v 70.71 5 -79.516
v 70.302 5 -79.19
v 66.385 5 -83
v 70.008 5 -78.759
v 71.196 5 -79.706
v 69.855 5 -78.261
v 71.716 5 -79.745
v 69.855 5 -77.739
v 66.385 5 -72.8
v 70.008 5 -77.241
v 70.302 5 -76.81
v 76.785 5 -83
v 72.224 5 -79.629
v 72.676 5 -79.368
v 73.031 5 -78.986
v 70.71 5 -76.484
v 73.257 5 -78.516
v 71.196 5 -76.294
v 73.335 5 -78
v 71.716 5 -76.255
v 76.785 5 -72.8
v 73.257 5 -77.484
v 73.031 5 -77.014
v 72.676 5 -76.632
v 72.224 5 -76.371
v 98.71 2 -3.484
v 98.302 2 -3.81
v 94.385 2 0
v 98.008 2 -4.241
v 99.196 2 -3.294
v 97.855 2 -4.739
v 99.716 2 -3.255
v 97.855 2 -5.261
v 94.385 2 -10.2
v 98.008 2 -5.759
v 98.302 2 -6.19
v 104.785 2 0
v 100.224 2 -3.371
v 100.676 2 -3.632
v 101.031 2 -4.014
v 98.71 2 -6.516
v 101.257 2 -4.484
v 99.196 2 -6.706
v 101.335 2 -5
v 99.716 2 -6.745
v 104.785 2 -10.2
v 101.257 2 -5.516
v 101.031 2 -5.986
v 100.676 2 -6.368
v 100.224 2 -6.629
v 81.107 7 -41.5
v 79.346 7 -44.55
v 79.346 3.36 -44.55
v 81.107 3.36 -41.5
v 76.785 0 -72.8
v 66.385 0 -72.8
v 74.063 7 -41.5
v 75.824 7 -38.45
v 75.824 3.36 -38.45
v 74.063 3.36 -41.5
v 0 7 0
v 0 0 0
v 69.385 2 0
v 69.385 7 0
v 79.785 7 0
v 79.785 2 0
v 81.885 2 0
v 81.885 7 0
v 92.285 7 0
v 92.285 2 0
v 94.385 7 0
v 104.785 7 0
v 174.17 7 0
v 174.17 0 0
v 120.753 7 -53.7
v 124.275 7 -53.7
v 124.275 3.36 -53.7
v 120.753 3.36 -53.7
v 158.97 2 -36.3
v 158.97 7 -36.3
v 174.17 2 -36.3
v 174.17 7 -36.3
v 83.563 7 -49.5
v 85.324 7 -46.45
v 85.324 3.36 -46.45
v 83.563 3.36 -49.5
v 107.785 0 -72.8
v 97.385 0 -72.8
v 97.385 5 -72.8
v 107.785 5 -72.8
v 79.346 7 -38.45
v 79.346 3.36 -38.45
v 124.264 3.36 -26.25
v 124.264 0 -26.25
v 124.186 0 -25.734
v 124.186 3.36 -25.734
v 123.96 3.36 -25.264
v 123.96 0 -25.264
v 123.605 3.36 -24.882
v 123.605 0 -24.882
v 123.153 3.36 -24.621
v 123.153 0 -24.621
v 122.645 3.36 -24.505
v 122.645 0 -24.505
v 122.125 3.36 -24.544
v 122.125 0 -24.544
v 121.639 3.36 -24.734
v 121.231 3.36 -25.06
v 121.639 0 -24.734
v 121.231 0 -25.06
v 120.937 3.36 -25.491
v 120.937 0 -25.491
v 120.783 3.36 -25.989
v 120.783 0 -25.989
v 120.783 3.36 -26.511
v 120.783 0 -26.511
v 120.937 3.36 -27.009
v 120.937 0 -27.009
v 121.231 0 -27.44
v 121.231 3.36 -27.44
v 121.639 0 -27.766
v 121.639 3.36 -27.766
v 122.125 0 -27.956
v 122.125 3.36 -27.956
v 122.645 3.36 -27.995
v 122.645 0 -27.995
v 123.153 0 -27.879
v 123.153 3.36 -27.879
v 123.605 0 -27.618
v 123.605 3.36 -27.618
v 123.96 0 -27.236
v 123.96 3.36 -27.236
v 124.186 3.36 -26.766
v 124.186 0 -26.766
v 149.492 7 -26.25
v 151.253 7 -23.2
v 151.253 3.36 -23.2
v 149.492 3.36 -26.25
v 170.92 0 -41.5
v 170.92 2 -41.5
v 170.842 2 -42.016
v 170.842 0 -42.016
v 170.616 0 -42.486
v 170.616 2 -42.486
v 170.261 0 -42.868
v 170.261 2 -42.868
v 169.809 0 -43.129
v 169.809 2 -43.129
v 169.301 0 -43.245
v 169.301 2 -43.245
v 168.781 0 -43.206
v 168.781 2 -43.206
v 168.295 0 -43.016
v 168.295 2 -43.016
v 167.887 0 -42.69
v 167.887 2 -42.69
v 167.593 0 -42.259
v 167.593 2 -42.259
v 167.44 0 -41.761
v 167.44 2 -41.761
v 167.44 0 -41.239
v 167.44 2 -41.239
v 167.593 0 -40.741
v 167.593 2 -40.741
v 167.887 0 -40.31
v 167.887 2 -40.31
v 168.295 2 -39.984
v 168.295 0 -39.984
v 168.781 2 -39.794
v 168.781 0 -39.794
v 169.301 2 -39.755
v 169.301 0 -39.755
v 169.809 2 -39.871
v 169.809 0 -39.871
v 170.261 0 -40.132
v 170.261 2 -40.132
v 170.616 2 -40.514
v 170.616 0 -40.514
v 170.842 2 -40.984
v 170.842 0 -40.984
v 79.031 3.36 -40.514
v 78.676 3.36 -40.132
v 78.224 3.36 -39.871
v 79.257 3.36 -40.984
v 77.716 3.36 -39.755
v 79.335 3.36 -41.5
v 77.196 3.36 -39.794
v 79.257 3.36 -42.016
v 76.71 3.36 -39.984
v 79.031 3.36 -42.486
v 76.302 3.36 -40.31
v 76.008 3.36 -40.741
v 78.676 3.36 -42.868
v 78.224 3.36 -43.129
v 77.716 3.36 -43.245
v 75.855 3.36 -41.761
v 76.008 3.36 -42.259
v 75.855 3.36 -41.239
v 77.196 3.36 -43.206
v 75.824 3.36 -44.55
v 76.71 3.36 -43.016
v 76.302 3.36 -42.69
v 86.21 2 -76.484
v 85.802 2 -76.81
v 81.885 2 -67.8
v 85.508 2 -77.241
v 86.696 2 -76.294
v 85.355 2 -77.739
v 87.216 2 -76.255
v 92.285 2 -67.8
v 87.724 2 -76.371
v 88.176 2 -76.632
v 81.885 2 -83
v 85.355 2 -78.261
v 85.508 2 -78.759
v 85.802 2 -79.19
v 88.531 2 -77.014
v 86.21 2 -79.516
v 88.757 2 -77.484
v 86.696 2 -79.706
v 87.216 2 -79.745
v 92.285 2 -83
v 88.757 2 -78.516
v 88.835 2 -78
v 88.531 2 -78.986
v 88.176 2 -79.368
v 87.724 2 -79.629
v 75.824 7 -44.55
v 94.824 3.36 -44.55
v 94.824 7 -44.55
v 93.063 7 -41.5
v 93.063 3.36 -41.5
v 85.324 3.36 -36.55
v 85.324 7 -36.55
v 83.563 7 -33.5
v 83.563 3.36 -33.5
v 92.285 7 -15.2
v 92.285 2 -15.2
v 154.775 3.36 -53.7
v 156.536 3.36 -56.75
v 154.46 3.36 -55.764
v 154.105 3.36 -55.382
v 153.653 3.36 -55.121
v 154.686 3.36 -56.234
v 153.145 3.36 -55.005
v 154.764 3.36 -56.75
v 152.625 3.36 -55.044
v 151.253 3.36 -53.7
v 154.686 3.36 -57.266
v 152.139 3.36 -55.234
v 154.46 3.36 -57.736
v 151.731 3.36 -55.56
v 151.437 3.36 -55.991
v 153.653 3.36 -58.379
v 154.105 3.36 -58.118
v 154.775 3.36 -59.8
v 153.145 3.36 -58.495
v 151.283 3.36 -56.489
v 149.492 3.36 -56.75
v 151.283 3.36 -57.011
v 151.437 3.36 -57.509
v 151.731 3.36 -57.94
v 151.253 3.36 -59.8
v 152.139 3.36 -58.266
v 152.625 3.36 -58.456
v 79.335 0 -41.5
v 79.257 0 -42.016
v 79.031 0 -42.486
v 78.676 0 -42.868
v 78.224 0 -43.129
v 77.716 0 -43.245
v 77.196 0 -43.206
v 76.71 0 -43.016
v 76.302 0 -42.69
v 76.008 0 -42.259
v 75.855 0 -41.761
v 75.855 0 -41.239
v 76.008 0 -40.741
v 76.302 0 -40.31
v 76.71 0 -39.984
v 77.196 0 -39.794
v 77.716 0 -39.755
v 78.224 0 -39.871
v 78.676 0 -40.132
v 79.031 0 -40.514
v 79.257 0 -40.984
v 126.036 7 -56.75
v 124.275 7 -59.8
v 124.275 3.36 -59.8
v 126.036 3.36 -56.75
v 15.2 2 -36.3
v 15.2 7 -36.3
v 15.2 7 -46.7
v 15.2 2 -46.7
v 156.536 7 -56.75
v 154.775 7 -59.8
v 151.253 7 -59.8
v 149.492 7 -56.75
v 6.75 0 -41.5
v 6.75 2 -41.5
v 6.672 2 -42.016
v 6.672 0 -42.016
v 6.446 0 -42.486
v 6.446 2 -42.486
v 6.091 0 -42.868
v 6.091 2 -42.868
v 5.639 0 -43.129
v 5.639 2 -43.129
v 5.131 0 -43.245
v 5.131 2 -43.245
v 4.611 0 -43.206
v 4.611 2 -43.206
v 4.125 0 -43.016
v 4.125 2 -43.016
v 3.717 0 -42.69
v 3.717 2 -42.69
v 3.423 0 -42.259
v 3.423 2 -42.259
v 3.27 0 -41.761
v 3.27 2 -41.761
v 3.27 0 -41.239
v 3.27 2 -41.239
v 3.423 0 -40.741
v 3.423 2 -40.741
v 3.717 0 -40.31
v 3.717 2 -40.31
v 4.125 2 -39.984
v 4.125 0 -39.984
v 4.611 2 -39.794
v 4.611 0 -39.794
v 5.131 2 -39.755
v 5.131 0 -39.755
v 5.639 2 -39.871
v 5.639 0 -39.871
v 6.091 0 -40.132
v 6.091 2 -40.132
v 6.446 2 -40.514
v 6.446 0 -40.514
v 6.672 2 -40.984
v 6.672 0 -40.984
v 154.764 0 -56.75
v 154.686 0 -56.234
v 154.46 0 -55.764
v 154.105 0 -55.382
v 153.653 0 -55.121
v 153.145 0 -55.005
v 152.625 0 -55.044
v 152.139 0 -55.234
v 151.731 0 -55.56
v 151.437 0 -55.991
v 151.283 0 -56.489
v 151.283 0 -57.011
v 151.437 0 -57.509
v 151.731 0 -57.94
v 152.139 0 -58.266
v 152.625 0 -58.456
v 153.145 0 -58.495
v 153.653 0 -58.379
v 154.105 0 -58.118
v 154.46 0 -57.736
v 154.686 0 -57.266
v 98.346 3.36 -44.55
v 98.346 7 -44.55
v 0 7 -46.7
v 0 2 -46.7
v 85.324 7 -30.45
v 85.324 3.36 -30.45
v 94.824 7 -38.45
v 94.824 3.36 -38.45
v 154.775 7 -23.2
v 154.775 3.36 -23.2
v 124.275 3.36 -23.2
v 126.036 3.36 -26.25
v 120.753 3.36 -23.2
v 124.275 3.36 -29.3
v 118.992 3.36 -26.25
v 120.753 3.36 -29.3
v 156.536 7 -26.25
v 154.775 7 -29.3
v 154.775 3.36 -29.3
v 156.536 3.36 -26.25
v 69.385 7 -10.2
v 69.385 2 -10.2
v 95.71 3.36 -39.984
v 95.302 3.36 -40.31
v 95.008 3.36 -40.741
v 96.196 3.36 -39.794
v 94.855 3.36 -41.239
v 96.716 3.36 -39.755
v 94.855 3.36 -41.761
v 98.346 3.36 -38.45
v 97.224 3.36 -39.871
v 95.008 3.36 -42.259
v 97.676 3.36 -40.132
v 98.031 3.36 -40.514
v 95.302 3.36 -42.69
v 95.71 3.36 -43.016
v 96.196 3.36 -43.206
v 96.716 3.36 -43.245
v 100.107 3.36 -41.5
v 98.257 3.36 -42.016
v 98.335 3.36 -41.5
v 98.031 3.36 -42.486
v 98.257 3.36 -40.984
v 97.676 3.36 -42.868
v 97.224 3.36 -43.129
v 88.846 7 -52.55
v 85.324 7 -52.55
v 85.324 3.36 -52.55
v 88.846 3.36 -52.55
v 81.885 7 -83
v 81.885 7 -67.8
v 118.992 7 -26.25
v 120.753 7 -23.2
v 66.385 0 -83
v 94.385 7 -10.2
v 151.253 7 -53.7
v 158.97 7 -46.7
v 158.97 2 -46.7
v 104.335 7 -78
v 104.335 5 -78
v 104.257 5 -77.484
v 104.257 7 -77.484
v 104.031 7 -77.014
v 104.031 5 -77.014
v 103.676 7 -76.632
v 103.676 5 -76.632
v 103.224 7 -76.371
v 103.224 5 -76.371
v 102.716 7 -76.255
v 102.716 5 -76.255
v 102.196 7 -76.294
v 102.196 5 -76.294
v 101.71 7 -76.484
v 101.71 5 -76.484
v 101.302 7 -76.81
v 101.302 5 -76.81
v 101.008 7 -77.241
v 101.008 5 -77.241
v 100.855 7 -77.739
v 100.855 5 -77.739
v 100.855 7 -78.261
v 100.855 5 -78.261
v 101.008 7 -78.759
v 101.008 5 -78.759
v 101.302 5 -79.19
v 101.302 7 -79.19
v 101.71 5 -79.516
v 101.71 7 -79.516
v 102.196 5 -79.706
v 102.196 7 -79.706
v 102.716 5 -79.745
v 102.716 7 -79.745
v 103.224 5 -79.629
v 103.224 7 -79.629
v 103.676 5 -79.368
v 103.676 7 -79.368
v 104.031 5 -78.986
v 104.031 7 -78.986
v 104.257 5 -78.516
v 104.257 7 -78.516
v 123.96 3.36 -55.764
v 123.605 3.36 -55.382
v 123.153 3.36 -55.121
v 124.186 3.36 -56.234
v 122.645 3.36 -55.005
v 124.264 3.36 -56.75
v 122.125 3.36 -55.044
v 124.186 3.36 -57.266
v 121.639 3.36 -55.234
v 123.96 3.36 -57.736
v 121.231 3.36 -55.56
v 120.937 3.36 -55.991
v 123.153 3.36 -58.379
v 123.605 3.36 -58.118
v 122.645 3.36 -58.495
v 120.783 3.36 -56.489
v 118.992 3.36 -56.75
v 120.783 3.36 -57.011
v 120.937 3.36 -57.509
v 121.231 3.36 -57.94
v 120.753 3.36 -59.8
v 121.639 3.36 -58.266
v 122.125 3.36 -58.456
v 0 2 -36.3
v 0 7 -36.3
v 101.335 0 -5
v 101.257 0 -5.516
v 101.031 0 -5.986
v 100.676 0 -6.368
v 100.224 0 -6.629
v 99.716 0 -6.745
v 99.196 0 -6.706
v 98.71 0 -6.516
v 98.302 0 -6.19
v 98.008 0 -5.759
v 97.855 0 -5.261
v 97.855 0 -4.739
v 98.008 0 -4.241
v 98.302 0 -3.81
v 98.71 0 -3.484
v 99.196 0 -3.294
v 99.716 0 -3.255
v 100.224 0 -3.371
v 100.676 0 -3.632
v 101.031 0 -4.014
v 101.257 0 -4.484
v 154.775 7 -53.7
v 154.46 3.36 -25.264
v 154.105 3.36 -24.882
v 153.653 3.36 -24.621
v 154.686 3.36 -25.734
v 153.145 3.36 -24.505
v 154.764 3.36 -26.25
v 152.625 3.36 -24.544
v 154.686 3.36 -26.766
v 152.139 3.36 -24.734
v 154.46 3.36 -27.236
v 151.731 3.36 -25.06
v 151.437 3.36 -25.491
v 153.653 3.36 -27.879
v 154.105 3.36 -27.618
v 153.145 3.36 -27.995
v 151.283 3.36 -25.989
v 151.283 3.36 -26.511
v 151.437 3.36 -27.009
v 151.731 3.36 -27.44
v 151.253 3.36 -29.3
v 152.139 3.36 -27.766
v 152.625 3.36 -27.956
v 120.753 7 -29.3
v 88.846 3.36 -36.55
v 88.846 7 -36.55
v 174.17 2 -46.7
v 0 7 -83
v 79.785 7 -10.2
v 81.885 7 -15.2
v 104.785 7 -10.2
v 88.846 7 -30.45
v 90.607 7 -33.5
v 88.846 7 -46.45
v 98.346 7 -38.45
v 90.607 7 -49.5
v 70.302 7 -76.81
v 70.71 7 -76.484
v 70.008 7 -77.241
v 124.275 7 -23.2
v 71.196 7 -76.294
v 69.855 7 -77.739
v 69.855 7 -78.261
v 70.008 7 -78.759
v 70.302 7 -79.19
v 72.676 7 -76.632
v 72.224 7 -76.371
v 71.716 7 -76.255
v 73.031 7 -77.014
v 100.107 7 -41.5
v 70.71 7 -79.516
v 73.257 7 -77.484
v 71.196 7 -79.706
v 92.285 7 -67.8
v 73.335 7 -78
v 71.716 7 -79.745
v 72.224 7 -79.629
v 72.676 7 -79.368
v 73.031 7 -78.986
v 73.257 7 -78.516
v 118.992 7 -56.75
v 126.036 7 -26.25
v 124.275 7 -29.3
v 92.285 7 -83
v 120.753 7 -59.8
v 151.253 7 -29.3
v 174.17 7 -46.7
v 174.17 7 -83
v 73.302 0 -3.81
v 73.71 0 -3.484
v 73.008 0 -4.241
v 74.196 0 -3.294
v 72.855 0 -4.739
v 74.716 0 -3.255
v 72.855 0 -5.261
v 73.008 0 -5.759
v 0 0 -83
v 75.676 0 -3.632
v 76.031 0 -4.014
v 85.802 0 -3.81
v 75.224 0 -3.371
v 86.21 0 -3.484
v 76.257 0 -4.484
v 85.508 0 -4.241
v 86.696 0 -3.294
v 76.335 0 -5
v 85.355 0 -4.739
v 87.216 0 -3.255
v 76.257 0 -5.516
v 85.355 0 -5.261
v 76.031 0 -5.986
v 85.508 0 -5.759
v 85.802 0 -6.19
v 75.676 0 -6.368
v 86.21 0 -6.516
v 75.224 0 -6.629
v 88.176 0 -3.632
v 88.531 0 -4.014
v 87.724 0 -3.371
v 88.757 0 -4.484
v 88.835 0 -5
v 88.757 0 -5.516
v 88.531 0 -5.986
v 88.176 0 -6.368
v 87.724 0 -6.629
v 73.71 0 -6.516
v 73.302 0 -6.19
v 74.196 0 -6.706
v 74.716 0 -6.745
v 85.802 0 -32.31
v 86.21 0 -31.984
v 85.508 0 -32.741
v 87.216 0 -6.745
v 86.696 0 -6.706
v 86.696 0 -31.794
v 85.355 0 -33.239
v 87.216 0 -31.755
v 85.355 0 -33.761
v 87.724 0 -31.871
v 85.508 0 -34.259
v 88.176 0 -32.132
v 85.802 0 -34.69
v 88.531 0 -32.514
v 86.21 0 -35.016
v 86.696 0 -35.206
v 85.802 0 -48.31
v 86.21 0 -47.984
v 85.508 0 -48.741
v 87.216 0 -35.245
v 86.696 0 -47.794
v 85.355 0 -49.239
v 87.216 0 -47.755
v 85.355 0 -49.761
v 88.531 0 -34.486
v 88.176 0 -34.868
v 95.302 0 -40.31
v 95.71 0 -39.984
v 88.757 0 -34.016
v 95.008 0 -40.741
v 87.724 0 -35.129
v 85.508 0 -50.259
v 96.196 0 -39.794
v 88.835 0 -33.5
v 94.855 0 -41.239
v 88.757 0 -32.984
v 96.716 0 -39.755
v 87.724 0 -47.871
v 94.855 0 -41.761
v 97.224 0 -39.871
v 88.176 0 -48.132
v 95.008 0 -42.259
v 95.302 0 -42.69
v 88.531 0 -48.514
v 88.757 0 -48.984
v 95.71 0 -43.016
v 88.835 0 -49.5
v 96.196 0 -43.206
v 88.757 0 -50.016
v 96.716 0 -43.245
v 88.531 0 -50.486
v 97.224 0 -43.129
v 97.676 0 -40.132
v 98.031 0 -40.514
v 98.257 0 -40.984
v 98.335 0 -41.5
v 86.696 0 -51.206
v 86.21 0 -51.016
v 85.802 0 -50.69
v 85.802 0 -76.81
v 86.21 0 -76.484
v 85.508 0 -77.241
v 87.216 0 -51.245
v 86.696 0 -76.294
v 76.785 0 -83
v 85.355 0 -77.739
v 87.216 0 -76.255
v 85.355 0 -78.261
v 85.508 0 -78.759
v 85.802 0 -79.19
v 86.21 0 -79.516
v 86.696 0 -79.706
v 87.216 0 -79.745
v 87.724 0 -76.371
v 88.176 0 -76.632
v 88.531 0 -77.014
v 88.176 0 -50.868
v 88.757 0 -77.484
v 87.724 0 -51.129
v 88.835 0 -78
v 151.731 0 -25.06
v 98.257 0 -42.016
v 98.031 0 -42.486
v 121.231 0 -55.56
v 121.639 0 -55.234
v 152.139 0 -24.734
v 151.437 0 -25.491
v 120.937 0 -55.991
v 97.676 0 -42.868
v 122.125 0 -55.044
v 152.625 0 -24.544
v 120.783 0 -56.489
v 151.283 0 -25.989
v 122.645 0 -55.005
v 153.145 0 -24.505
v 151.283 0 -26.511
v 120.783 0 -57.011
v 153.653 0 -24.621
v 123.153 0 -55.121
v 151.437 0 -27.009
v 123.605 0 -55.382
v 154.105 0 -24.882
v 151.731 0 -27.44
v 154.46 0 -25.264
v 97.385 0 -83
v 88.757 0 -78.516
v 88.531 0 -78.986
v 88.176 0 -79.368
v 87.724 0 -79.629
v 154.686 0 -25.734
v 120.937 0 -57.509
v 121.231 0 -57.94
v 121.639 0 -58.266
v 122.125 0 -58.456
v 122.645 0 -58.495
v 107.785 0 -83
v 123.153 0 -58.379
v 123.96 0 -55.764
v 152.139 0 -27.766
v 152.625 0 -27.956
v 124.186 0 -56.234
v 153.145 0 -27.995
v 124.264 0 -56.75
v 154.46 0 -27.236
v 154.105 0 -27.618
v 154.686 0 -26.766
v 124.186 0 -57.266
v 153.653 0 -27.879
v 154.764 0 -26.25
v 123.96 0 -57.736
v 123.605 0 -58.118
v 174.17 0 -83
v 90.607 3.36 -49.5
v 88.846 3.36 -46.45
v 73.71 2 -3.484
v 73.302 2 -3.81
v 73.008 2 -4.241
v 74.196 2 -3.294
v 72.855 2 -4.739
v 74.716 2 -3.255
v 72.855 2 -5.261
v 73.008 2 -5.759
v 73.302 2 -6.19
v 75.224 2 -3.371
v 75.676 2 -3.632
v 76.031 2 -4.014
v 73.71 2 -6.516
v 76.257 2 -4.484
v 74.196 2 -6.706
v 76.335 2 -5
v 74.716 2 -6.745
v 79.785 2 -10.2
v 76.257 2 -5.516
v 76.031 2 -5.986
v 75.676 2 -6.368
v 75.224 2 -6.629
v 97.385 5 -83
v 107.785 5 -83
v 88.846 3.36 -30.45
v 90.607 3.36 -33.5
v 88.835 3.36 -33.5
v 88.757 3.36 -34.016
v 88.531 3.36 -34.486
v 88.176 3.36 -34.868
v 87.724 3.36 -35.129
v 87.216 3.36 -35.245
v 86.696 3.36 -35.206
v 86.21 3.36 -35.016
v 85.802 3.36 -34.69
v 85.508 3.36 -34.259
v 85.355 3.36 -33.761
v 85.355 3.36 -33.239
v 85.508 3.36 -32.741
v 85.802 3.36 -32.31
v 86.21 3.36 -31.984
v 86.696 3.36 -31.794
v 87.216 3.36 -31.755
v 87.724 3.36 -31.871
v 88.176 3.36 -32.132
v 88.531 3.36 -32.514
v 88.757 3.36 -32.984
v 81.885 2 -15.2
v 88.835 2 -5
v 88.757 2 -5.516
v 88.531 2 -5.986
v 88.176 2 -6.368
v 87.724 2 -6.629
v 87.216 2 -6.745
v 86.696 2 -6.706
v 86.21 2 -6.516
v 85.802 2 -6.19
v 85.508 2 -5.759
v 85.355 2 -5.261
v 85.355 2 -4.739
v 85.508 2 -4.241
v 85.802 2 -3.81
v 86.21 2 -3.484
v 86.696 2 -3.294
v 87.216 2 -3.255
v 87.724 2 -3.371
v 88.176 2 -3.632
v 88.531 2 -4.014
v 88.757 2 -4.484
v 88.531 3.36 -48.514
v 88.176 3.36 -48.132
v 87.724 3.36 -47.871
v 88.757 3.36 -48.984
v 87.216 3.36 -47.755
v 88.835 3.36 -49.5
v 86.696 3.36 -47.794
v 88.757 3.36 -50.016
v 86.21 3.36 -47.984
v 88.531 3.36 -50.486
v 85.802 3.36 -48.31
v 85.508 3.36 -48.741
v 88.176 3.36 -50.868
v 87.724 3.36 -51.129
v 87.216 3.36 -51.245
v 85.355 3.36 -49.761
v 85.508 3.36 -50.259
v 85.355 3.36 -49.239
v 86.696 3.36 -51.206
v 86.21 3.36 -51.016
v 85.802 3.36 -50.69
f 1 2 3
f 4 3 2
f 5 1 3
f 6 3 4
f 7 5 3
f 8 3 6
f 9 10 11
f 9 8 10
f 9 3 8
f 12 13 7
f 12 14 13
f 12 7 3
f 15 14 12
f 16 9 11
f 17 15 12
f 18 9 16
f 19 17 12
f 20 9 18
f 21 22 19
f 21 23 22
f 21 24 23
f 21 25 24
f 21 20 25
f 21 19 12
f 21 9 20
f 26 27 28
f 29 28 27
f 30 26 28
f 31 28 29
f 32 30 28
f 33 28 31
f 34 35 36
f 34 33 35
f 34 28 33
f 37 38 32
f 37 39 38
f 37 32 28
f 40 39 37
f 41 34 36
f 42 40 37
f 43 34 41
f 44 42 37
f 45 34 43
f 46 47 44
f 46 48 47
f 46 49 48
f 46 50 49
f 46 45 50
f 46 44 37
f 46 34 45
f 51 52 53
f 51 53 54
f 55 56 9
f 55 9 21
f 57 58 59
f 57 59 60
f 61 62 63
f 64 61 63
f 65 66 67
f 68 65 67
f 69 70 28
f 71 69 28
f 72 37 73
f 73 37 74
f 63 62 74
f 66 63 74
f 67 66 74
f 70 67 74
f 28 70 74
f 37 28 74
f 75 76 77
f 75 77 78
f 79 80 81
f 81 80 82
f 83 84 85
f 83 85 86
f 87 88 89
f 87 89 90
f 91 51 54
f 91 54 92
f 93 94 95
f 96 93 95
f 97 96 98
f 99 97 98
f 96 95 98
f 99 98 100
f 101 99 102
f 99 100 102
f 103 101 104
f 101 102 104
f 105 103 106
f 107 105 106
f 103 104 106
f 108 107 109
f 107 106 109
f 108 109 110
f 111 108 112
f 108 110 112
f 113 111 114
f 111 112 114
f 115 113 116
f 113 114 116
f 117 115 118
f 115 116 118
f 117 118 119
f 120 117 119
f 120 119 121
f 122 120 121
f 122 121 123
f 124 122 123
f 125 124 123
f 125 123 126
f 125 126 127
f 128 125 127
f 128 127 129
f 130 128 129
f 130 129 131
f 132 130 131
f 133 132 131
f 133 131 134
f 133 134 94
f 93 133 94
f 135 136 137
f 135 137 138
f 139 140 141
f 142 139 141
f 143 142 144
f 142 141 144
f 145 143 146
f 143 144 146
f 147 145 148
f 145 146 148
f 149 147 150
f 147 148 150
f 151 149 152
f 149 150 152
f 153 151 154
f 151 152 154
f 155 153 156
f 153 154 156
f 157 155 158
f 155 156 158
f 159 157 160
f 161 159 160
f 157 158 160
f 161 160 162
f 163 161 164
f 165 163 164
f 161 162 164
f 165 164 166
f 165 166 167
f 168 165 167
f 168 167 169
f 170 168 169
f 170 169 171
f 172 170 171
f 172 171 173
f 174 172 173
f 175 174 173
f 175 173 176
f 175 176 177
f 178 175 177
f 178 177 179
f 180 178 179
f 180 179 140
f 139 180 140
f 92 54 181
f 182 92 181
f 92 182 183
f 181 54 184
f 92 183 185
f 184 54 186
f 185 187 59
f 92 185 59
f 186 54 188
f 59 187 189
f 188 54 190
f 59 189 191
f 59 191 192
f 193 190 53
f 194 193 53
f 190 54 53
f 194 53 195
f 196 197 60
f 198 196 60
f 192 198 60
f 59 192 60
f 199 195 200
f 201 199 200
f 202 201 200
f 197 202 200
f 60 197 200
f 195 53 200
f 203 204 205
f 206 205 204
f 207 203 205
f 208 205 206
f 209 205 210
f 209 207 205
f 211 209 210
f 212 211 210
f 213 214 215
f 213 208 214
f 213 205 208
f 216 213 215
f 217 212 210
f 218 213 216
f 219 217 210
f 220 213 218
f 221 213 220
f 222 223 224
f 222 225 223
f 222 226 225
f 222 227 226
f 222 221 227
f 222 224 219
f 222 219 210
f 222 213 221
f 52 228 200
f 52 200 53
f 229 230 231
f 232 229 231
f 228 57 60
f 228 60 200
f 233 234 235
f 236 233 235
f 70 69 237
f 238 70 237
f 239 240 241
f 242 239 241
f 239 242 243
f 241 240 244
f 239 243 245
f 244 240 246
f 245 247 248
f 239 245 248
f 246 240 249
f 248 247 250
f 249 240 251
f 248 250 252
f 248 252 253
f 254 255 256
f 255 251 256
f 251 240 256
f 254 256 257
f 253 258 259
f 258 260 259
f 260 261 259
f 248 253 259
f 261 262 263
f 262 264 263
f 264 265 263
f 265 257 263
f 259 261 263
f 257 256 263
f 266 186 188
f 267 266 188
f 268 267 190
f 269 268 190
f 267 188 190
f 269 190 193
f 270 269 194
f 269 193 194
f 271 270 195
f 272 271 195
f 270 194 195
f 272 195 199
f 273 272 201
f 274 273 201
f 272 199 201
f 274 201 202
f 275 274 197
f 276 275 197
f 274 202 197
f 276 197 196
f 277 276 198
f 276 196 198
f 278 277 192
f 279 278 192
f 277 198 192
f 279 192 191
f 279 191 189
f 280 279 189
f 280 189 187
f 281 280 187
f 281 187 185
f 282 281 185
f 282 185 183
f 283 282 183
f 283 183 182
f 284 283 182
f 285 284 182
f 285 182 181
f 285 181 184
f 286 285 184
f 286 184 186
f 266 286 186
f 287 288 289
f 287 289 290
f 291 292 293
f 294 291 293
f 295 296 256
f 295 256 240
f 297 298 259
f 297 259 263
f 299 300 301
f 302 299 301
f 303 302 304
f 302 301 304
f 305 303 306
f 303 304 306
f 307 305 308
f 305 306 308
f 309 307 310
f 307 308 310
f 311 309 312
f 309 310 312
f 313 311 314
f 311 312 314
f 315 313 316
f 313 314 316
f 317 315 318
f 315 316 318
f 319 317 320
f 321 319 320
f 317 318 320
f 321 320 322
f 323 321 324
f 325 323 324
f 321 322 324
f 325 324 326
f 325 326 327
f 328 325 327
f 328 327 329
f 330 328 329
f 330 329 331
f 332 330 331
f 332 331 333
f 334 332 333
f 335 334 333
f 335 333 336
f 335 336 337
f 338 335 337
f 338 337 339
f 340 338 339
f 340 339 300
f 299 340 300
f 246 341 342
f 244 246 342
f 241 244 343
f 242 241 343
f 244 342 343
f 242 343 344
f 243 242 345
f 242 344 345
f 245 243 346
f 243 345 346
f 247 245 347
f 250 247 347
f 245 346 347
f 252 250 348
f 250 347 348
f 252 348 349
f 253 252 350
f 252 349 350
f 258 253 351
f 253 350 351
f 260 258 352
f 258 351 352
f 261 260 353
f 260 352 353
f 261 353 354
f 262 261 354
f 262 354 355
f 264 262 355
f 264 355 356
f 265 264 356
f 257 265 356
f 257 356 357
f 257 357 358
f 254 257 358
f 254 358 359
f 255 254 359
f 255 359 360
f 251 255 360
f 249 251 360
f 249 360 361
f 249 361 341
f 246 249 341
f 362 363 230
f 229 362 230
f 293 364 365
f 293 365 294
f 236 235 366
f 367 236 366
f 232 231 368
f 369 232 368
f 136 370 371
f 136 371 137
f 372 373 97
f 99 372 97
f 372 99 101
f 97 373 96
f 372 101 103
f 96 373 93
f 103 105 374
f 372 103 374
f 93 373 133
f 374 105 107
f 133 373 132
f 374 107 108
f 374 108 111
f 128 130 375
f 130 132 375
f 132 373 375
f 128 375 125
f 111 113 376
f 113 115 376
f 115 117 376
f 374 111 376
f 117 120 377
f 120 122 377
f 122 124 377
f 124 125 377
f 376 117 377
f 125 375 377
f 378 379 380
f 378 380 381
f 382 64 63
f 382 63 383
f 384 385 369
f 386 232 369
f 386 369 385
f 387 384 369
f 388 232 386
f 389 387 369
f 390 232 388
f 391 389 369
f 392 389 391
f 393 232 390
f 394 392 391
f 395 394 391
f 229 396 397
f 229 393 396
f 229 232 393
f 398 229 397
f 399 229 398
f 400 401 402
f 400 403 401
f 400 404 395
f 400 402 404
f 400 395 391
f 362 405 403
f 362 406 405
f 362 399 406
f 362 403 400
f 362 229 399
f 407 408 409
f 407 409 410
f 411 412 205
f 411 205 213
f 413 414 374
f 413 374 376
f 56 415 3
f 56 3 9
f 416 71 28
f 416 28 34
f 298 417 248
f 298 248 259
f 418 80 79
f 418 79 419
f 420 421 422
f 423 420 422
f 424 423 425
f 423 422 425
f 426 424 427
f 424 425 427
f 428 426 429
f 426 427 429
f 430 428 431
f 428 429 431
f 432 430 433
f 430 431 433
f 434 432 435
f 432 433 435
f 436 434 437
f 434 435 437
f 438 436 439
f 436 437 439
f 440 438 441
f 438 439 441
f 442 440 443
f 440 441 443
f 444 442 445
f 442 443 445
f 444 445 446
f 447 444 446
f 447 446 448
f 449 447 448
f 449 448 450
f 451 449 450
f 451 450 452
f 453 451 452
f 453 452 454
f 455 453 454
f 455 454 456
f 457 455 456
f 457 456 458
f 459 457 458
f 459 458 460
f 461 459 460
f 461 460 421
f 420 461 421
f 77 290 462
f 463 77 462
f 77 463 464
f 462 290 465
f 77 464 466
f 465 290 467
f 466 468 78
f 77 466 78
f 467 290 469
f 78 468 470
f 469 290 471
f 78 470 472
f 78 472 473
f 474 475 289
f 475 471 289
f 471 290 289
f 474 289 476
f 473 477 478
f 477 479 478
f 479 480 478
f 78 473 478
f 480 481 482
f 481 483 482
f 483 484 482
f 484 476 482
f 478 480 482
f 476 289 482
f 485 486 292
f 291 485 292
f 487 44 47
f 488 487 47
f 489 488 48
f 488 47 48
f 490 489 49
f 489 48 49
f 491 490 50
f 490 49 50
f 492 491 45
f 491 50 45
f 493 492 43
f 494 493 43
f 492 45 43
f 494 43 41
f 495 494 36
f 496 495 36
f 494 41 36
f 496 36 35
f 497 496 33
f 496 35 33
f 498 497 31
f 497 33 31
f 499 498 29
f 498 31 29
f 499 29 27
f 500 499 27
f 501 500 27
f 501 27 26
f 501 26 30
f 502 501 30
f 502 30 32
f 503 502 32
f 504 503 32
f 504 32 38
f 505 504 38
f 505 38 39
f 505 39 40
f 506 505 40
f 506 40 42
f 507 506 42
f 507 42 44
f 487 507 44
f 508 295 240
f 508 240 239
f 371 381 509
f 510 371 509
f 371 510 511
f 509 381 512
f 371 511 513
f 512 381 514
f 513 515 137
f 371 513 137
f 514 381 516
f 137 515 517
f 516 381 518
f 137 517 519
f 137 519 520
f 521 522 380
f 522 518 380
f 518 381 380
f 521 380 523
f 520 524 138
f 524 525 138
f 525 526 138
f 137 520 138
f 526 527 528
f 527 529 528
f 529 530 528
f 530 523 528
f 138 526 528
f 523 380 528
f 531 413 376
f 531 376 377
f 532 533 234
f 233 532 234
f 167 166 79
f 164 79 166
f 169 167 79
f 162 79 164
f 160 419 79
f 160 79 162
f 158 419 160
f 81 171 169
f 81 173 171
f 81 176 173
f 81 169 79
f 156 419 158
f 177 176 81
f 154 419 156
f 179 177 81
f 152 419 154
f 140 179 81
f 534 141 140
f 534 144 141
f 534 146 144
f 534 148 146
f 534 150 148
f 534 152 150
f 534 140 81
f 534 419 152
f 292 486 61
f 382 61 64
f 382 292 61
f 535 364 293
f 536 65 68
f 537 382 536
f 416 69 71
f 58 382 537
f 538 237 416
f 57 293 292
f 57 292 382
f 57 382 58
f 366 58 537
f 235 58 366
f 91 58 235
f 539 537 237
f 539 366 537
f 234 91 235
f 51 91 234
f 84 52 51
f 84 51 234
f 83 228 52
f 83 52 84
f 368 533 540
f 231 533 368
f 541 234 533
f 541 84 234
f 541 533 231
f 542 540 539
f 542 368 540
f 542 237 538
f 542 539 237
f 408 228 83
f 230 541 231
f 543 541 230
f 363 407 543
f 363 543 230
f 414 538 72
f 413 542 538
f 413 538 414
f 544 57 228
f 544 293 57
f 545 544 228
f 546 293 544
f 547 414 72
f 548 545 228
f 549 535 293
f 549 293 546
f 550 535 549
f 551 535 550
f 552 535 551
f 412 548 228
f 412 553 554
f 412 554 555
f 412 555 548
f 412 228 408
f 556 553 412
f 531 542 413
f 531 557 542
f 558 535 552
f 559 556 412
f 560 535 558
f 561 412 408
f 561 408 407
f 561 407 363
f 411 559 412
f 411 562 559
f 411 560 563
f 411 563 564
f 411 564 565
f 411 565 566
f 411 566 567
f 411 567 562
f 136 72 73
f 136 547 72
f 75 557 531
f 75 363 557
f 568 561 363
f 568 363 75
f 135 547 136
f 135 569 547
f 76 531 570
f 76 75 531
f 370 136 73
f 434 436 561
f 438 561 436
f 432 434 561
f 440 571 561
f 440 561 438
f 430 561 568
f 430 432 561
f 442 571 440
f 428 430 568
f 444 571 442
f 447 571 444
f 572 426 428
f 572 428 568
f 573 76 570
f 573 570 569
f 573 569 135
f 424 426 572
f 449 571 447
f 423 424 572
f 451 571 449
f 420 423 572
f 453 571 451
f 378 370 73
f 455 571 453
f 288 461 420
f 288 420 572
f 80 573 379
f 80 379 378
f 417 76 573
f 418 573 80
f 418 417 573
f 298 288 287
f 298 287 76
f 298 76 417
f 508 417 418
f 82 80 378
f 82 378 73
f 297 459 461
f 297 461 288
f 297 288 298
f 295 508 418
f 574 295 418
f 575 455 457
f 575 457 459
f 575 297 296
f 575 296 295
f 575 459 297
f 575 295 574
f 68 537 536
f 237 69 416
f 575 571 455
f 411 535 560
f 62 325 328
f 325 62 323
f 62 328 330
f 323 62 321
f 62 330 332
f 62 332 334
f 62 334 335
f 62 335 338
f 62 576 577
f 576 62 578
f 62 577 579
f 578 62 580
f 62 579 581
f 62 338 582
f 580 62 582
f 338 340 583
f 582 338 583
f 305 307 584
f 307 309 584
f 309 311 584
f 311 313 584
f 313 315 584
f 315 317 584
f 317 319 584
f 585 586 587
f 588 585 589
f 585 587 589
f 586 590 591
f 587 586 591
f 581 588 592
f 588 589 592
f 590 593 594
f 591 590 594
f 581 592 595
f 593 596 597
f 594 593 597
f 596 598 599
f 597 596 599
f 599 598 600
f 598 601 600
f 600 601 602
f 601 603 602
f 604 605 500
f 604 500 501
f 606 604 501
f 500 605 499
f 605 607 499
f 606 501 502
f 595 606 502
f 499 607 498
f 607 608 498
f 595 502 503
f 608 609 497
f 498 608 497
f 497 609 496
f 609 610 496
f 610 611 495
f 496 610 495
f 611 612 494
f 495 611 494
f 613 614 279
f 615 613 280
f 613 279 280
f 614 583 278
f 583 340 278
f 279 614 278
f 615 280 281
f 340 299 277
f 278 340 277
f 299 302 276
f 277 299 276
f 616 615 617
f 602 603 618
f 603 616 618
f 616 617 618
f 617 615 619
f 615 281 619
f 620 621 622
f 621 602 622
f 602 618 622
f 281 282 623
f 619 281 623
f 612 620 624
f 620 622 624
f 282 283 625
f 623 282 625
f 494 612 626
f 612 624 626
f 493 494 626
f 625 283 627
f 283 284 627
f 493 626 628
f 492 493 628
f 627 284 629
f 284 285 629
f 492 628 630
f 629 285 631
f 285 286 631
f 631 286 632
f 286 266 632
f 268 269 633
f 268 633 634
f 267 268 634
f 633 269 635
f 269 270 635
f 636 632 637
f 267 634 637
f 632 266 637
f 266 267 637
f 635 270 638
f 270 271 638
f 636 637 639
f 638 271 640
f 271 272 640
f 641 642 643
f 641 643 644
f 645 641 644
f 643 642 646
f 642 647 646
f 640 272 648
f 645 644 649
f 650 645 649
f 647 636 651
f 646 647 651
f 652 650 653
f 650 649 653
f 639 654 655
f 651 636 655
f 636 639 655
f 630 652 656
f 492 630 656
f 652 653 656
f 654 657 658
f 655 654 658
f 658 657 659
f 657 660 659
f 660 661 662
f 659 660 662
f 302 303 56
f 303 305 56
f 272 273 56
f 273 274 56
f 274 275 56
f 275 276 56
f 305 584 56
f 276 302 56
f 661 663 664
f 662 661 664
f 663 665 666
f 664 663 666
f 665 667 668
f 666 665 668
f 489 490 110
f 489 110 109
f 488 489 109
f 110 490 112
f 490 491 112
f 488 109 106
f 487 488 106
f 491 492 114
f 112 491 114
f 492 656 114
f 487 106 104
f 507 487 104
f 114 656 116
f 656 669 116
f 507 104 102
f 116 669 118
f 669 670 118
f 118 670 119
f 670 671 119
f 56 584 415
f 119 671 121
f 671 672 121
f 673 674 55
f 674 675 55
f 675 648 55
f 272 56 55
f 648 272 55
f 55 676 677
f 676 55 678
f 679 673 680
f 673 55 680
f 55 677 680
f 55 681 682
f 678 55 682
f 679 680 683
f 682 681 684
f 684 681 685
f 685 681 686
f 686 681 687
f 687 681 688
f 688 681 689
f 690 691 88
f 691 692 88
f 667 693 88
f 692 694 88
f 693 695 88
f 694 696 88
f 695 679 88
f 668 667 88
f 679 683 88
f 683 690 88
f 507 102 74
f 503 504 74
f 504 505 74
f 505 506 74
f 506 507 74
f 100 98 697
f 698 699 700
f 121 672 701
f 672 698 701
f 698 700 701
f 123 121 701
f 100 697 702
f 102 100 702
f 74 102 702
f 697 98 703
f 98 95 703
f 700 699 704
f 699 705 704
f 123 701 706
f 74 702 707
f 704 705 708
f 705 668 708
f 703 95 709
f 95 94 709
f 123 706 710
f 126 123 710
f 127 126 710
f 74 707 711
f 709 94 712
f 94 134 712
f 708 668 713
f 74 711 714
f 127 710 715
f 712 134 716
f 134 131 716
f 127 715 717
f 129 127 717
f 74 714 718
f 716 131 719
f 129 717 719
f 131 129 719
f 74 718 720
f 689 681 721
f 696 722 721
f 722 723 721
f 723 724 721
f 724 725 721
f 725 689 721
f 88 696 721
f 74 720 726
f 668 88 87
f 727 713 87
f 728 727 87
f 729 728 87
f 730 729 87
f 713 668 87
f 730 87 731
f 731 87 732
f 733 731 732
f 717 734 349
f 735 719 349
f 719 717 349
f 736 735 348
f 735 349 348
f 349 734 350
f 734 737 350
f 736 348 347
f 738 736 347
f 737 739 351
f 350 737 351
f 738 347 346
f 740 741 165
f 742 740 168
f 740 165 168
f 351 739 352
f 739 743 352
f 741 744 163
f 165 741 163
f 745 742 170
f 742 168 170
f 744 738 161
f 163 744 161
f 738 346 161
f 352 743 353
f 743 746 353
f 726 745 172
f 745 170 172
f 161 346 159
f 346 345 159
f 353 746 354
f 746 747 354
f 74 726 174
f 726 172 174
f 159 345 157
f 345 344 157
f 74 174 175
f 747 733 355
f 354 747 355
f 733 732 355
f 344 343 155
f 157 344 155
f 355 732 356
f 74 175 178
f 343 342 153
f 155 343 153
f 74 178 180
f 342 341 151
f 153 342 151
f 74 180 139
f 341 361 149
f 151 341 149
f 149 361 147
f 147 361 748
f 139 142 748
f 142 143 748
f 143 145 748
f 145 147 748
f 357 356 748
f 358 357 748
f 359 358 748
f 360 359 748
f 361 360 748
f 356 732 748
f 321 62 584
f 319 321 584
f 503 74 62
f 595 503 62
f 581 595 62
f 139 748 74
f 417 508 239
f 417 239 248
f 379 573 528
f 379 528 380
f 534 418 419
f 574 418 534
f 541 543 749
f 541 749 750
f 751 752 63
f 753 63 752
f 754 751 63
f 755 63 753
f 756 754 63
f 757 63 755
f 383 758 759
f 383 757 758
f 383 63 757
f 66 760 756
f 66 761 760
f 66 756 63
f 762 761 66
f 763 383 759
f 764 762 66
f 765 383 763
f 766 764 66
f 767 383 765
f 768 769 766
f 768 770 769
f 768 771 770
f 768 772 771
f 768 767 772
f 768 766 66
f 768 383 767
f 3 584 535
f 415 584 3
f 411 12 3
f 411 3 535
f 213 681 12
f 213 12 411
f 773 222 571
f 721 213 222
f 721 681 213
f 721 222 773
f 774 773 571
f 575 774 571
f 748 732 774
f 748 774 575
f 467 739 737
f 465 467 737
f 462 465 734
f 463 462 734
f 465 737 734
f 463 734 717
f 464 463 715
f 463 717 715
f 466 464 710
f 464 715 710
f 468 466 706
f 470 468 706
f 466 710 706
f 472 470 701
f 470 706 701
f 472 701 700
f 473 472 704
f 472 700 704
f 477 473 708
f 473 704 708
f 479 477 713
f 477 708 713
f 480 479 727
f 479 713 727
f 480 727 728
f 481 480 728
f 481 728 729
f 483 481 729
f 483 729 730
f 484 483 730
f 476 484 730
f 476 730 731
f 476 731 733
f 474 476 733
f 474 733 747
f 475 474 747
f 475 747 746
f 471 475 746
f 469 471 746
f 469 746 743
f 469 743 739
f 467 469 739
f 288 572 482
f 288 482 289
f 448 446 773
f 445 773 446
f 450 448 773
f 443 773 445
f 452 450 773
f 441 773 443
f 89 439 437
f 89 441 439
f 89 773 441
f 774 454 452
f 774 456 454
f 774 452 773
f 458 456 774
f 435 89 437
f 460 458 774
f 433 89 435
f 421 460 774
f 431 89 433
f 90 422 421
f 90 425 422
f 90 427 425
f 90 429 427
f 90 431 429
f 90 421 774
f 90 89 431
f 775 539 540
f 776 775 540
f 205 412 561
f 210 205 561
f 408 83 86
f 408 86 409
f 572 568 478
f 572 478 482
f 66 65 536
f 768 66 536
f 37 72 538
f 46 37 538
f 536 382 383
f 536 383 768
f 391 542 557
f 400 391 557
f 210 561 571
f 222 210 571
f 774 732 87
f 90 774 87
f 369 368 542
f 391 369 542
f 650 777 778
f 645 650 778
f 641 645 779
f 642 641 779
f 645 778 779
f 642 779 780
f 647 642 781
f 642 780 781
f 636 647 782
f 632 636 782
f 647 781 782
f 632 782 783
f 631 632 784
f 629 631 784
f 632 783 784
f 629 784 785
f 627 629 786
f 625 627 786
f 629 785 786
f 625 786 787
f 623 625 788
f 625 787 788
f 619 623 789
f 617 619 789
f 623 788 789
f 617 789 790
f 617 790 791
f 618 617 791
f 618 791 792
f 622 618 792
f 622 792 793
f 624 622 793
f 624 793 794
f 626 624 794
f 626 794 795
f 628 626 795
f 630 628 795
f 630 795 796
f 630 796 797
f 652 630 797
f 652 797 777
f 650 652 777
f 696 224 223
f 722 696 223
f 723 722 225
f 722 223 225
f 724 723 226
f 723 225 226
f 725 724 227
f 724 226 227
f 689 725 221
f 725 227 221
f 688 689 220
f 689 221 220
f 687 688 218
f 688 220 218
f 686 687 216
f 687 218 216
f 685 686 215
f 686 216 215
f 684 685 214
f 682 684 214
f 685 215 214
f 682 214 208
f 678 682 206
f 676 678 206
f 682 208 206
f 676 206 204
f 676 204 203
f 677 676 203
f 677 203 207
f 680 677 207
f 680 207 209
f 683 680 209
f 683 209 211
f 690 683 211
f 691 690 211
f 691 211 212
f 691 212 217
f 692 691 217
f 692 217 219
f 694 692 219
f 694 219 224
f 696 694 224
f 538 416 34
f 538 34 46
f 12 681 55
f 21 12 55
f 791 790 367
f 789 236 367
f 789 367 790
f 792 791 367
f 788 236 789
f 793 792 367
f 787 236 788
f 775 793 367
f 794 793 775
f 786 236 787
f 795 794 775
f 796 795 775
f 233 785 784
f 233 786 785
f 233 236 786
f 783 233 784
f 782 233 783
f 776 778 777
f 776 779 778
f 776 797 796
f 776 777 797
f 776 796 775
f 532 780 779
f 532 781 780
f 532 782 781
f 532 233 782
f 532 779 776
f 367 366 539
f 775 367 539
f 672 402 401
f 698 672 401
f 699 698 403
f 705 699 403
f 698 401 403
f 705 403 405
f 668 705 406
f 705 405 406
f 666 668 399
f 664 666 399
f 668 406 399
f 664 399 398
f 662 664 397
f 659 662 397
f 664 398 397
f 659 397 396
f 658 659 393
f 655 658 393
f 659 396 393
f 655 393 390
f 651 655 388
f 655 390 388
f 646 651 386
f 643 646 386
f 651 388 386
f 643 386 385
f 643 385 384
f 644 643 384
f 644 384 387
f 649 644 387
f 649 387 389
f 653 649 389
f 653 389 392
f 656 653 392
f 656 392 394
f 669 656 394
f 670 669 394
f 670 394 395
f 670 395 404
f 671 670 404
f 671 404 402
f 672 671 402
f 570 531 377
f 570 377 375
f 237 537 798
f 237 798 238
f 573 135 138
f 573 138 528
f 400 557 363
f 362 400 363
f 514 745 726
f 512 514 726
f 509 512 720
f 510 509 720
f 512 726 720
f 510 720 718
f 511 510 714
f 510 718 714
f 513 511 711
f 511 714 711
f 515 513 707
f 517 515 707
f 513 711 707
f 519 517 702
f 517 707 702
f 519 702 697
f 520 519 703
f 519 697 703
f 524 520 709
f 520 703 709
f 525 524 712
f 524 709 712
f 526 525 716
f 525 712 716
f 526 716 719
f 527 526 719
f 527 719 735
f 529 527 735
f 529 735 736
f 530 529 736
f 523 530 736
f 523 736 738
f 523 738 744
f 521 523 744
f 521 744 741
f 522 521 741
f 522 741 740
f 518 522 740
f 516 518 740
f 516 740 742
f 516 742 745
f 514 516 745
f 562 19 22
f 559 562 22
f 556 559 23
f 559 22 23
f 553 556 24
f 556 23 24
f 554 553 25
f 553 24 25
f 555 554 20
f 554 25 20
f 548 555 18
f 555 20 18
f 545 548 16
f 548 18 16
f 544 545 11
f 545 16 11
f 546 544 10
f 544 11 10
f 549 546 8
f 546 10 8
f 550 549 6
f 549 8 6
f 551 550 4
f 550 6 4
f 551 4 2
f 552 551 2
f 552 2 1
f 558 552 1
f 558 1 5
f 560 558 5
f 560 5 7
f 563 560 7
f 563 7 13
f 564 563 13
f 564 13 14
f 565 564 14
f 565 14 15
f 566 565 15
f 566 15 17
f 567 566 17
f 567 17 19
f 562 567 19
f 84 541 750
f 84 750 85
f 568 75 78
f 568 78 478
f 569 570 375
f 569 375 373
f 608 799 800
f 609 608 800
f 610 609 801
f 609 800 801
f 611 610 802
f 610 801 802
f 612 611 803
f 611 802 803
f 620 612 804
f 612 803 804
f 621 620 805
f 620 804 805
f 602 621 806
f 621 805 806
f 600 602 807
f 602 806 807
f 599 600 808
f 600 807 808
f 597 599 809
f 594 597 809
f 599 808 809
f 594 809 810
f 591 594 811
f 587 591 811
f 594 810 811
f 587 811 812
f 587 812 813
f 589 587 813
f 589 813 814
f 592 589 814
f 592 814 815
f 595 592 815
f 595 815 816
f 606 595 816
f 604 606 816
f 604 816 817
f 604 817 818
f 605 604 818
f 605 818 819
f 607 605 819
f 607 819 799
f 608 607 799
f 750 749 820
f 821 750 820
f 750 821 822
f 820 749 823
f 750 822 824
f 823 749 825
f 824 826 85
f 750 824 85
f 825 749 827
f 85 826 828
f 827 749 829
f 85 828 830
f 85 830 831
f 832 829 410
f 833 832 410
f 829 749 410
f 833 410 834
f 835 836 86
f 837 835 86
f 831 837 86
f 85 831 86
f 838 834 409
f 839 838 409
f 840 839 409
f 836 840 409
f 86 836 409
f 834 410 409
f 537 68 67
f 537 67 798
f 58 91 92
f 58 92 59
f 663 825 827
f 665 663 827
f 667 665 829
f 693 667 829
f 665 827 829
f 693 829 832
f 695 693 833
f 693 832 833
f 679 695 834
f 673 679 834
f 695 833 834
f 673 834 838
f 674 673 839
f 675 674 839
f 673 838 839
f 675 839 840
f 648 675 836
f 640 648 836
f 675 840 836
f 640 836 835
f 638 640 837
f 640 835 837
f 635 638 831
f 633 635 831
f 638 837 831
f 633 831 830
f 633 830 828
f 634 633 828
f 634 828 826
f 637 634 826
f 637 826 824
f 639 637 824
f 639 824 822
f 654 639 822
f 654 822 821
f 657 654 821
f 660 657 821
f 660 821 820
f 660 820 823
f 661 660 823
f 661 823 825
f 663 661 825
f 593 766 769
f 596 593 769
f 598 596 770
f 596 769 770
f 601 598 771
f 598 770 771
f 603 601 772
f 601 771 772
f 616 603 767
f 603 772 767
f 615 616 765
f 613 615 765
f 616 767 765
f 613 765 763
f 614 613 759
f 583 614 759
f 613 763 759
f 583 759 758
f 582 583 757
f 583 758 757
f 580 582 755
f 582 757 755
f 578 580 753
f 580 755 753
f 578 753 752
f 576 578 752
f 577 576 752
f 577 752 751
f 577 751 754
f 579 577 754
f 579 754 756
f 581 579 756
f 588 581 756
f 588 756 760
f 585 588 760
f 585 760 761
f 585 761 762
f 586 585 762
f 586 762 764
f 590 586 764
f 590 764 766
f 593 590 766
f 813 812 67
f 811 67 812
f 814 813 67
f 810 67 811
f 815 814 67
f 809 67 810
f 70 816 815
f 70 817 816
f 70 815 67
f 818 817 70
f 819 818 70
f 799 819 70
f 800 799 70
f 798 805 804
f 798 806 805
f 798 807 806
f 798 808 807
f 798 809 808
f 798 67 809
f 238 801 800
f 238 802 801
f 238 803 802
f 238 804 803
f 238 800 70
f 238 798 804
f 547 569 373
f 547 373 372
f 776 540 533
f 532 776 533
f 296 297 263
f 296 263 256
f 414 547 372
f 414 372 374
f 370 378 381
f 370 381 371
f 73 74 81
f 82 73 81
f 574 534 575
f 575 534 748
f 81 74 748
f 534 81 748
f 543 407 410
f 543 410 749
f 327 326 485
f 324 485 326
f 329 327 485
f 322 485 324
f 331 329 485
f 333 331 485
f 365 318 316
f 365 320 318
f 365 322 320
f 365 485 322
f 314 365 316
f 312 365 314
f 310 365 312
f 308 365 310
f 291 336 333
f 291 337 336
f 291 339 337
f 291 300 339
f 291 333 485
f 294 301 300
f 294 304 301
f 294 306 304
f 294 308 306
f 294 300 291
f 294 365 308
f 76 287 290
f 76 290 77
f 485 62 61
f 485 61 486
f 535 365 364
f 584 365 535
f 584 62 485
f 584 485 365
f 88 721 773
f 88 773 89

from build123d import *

# Parameters (mm, degrees)
SKETCH1_W           = 174.17
SKETCH1_H           = 83
BOSS_EXTRUDE1_DEPTH = 7
SKETCH2_R           = 1.75
CUT_EXTRUDE1_DEPTH  = 8
SKETCH3_R           = 1.75
CUT_EXTRUDE2_DEPTH  = 8
SKETCH4_W           = 15.4
SKETCH4_H           = 10.4
SKETCH4_W_2         = 10.4
SKETCH4_H_2         = 15.4
CUT_EXTRUDE3_DEPTH  = 5
SKETCH5_W           = 10.4
SKETCH5_H           = 10.4
CUT_EXTRUDE4_DEPTH  = 5
SKETCH6_R           = 1.75
CUT_EXTRUDE5_DEPTH  = 3
SKETCH12_R          = 1.75
CUT_EXTRUDE9_DEPTH  = 8
CUT_EXTRUDE6_DEPTH  = 3.64
SKETCH9_W           = 10.4
SKETCH9_H           = 10.4
CUT_EXTRUDE7_DEPTH  = 5
SKETCH10_R          = 1.75
CUT_EXTRUDE8_DEPTH  = 3


with BuildPart() as part:
    # Sketch1 → Boss-Extrude1 (new body)
    with BuildSketch(Plane(origin=(0, 0, 0), x_dir=(1, 0, 0), z_dir=(0, 1, 0))):
        with Locations((87.085, 41.5)):
            Rectangle(SKETCH1_W, SKETCH1_H)
    extrude(amount=BOSS_EXTRUDE1_DEPTH)

    # Sketch2 → Cut-Extrude1 (cut, through all)
    with BuildSketch(Plane(origin=(0, 7, 0), x_dir=(1, 0, 0), z_dir=(0, 1, 0))):
        with Locations((87.085, 49.5)):
            Circle(SKETCH2_R)
        with Locations((77.585, 41.5)):
            Circle(SKETCH2_R)
        with Locations((96.585, 41.5)):
            Circle(SKETCH2_R)
        with Locations((87.085, 33.5)):
            Circle(SKETCH2_R)
    extrude(amount=-CUT_EXTRUDE1_DEPTH, mode=Mode.SUBTRACT)

    # Sketch3 → Cut-Extrude2 (cut, through all)
    with BuildSketch(Plane(origin=(0, 7, 0), x_dir=(1, 0, 0), z_dir=(0, 1, 0))):
        with Locations((87.085, 78)):
            Circle(SKETCH3_R)
        with Locations((5, 41.5)):
            Circle(SKETCH3_R)
        with Locations((87.085, 5)):
            Circle(SKETCH3_R)
        with Locations((169.17, 41.5)):
            Circle(SKETCH3_R)
    extrude(amount=-CUT_EXTRUDE2_DEPTH, mode=Mode.SUBTRACT)

    # Sketch4 → Cut-Extrude3 (cut)
    with BuildSketch(Plane(origin=(0, 7, 0), x_dir=(1, 0, 0), z_dir=(0, 1, 0))):
        with Locations((7.5, 41.5)):
            Rectangle(SKETCH4_W, SKETCH4_H)
        with Locations((87.085, 7.5)):
            Rectangle(SKETCH4_W_2, SKETCH4_H_2)
        with Locations((87.085, 75.5)):
            Rectangle(SKETCH4_W_2, SKETCH4_H_2)
        with Locations((166.67, 41.5)):
            Rectangle(SKETCH4_W, SKETCH4_H)
    extrude(amount=-CUT_EXTRUDE3_DEPTH, mode=Mode.SUBTRACT)

    # Sketch5 → Cut-Extrude4 (cut)
    with BuildSketch(Plane(origin=(0, 7, 0), x_dir=(1, 0, 0), z_dir=(0, 1, 0))):
        with Locations((74.585, 5)):
            Rectangle(SKETCH5_W, SKETCH5_H)
        with Locations((99.585, 5)):
            Rectangle(SKETCH5_W, SKETCH5_H)
    extrude(amount=-CUT_EXTRUDE4_DEPTH, mode=Mode.SUBTRACT)

    # Sketch6 → Cut-Extrude5 (cut, through all)
    with BuildSketch(Plane(origin=(0, 2, 0), x_dir=(1, 0, 0), z_dir=(0, 1, 0))):
        with Locations((74.585, 5)):
            Circle(SKETCH6_R)
        with Locations((99.585, 5)):
            Circle(SKETCH6_R)
    extrude(amount=-CUT_EXTRUDE5_DEPTH, mode=Mode.SUBTRACT)

    # Sketch12 → Cut-Extrude9 (cut, through all)
    with BuildSketch(Plane.XZ):
        with Locations((122.51393219, -26.25)):
            Circle(SKETCH12_R)
        with Locations((153.01393219, -26.25)):
            Circle(SKETCH12_R)
        with Locations((122.51393219, -56.75)):
            Circle(SKETCH12_R)
        with Locations((153.01393219, -56.75)):
            Circle(SKETCH12_R)
    extrude(amount=-CUT_EXTRUDE9_DEPTH, mode=Mode.SUBTRACT)

    # Sketch7 → Cut-Extrude6 (cut)
    with BuildSketch(Plane(origin=(0, 7, 0), x_dir=(1, 0, 0), z_dir=(0, 1, 0))):
        Polygon((75.824081679, 44.55), (79.345918321, 44.55), (81.106836642, 41.5), (79.345918321, 38.45), (75.824081679, 38.45), (74.063163358, 41.5), align=None)
        Polygon((85.324081679, 52.55), (88.845918321, 52.55), (90.606836642, 49.5), (88.845918321, 46.45), (85.324081679, 46.45), (83.563163358, 49.5), align=None)
        Polygon((100.106836642, 41.5), (98.345918321, 44.55), (94.824081679, 44.55), (93.063163358, 41.5), (94.824081679, 38.45), (98.345918321, 38.45), align=None)
        Polygon((83.563163358, 33.5), (85.324081679, 30.45), (88.845918321, 30.45), (90.606836642, 33.5), (88.845918321, 36.55), (85.324081679, 36.55), align=None)
        Polygon((120.753013869, 29.3), (124.274850511, 29.3), (126.035768832, 26.25), (124.274850511, 23.2), (120.753013869, 23.2), (118.992095548, 26.25), align=None)
        Polygon((151.253013869, 29.3), (154.774850511, 29.3), (156.535768832, 26.25), (154.774850511, 23.2), (151.253013869, 23.2), (149.492095548, 26.25), align=None)
        Polygon((151.253013869, 59.8), (154.774850511, 59.8), (156.535768832, 56.75), (154.774850511, 53.7), (151.253013869, 53.7), (149.492095548, 56.75), align=None)
        Polygon((120.753013869, 59.8), (124.274850511, 59.8), (126.035768832, 56.75), (124.274850511, 53.7), (120.753013869, 53.7), (118.992095548, 56.75), align=None)
    extrude(amount=-CUT_EXTRUDE6_DEPTH, mode=Mode.SUBTRACT)

    # Sketch9 → Cut-Extrude7 (cut)
    with BuildSketch(Plane.XZ):
        with Locations((71.585, -78)):
            Rectangle(SKETCH9_W, SKETCH9_H)
        with Locations((102.585, -78)):
            Rectangle(SKETCH9_W, SKETCH9_H)
    extrude(amount=-CUT_EXTRUDE7_DEPTH, mode=Mode.SUBTRACT)

    # Sketch10 → Cut-Extrude8 (cut, through all)
    with BuildSketch(Plane.XZ.offset(-5)):
        with Locations((71.585, -78)):
            Circle(SKETCH10_R)
        with Locations((102.585, -78)):
            Circle(SKETCH10_R)
    extrude(amount=-CUT_EXTRUDE8_DEPTH, mode=Mode.SUBTRACT)


solid = part.part
